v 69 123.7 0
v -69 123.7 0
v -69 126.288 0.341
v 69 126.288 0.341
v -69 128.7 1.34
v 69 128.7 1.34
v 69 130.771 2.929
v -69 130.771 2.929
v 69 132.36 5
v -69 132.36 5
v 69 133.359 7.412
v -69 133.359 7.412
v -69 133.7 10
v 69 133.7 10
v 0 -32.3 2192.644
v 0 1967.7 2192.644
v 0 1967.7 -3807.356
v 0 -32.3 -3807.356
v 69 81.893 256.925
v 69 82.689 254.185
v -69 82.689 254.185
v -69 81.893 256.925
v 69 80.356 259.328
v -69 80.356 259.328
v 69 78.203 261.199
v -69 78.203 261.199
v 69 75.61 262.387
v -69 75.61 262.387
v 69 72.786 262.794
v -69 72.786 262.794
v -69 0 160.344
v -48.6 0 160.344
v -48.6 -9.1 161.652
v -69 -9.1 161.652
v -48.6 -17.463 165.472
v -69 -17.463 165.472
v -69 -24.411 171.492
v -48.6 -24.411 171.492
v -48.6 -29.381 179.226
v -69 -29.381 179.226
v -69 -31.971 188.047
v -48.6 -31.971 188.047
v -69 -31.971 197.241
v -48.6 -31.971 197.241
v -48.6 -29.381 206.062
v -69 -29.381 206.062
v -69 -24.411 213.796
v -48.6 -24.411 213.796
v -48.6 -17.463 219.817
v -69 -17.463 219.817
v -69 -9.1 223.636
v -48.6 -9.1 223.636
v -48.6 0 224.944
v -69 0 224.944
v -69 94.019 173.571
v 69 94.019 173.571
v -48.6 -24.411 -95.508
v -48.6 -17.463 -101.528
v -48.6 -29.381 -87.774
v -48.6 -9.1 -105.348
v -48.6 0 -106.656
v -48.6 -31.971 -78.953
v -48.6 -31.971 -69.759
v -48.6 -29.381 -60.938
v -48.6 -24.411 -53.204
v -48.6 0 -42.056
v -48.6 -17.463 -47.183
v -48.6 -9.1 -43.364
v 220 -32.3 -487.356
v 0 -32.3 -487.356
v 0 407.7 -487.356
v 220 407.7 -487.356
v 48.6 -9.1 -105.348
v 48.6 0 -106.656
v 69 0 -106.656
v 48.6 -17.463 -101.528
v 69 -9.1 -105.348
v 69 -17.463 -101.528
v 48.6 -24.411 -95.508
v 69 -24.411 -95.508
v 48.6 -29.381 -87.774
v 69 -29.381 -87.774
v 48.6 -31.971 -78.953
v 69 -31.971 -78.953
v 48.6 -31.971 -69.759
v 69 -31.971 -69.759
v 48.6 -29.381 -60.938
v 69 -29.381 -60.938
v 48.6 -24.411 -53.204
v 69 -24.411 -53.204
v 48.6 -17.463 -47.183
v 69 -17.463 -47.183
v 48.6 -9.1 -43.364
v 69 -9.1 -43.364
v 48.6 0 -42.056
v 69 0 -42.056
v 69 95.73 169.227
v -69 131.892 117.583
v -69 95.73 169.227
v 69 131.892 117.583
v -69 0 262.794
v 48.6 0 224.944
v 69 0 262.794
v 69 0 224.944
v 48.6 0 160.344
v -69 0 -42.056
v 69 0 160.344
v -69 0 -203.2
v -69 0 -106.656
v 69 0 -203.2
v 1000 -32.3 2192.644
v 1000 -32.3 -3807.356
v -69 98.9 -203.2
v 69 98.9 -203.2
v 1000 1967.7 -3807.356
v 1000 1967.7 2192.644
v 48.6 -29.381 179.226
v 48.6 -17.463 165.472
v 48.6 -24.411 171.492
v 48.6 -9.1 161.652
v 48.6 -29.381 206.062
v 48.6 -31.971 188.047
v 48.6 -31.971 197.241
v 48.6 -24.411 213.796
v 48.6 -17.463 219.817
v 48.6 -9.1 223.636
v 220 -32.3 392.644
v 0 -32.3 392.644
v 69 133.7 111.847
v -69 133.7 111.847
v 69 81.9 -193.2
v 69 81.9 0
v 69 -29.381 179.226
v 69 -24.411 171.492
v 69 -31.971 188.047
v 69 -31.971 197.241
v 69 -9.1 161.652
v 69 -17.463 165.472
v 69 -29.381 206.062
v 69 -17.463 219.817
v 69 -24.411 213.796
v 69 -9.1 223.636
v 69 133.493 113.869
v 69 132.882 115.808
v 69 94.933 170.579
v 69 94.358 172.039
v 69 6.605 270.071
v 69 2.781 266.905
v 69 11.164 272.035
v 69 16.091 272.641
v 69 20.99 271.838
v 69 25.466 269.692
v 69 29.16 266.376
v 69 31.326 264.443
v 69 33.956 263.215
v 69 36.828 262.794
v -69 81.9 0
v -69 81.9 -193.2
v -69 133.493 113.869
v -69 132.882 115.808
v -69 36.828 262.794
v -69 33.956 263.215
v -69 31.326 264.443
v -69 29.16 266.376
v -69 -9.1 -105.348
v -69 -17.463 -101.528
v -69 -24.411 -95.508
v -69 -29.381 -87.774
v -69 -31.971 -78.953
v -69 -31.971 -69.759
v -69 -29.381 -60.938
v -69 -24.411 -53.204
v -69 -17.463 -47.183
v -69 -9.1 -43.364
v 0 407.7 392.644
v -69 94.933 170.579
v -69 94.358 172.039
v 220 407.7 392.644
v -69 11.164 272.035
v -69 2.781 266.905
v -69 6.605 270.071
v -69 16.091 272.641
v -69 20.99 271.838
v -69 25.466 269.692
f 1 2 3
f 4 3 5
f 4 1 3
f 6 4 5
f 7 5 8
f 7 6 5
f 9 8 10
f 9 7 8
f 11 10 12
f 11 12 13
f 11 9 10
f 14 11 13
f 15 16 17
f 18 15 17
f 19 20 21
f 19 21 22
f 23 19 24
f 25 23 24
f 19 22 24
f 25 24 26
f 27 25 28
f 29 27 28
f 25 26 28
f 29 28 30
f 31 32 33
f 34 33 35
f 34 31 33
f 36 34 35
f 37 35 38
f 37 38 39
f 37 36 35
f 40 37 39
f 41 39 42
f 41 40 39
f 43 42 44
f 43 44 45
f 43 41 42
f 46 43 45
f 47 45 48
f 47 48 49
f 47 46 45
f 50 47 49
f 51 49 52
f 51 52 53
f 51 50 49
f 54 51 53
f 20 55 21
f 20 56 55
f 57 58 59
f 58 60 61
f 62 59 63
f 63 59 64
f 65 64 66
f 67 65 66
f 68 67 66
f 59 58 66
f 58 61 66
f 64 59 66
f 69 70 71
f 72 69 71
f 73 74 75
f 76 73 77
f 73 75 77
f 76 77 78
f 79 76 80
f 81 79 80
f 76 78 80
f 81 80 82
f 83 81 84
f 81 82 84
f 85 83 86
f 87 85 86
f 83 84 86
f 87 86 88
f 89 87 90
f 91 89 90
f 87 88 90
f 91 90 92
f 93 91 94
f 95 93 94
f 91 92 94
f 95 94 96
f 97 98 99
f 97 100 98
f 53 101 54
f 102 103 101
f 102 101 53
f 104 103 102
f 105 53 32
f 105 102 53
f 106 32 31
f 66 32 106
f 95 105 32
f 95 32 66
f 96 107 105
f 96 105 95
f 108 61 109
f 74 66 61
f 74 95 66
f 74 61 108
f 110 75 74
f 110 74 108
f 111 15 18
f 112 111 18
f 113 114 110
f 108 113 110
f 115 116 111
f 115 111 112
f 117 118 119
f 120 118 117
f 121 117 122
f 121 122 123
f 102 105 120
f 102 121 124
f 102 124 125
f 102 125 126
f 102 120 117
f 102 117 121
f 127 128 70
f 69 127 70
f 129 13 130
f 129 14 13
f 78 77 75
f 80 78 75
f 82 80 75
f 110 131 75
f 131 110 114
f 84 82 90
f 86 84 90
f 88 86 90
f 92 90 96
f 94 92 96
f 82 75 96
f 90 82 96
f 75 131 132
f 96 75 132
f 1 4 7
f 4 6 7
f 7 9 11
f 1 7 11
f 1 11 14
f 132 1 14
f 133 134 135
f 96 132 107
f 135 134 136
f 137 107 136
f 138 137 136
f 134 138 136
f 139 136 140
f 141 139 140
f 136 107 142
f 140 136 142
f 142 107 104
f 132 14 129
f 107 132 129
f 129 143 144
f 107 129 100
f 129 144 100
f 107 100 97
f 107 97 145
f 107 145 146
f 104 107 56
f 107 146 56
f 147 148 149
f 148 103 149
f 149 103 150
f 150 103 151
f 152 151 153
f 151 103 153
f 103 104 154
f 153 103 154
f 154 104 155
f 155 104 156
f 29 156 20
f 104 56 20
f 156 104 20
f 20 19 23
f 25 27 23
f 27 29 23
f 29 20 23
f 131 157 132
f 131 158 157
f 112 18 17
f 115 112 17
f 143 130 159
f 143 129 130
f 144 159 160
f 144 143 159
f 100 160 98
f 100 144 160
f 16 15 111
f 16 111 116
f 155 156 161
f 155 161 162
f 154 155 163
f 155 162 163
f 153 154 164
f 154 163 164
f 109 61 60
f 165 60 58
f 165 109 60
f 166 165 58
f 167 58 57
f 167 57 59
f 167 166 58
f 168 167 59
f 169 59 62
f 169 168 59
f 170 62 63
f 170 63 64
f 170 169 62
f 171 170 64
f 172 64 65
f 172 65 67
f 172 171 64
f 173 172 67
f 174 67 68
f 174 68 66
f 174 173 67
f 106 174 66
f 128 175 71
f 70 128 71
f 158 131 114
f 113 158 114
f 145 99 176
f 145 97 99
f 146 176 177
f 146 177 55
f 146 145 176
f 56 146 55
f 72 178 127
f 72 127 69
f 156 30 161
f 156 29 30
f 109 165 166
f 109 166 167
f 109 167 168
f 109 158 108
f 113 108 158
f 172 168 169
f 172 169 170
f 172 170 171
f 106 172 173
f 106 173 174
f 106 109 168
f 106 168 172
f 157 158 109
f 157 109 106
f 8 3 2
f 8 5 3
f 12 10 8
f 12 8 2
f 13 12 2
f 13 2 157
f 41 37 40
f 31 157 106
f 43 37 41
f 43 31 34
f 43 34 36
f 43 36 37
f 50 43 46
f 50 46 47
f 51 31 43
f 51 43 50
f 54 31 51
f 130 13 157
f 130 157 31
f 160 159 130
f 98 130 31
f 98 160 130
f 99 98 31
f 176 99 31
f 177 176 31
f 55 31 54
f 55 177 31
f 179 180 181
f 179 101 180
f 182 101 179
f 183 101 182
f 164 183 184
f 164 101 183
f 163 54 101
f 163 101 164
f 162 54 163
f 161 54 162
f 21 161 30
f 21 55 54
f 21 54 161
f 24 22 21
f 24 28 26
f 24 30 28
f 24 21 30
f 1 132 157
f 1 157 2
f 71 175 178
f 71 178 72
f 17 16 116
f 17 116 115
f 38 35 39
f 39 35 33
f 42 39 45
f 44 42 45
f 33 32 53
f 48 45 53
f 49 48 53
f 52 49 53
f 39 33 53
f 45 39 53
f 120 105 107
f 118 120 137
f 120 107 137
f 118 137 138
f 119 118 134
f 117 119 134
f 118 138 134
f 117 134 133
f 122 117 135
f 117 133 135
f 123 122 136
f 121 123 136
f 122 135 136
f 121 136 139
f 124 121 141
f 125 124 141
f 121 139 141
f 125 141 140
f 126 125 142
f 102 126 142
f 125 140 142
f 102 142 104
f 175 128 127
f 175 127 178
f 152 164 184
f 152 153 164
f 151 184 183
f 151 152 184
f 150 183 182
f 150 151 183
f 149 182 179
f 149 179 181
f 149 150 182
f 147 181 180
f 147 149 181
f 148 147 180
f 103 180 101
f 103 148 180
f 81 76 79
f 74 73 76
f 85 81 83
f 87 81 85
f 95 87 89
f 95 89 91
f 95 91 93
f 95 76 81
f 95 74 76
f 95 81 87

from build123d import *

# Parameters (mm, degrees)
BOSS_EXTRUDE1_DEPTH = 69
SKETCH4_W           = 15
SKETCH4_H           = 188.2
BOSS_EXTRUDE2_DEPTH = 61.9
BOSS_EXTRUDE3_DEPTH = 20.4
FILLET1_R           = 10
SKETCH6_W           = 6000
SKETCH6_H           = 2000
BOSS_EXTRUDE4_DEPTH = 1000
SKETCH8_W           = 880
SKETCH8_H           = 440
BOSS_EXTRUDE5_DEPTH = 220
SKETCH9_W           = 108
SKETCH9_H           = 188.2
BOSS_EXTRUDE6_DEPTH = 61.9
BOSS_EXTRUDE7_DEPTH = 138


with BuildPart() as part:
    # Sketch2 → Boss-Extrude1 (new body, symmetric)
    with BuildSketch(Plane(origin=(0, 0, 0), x_dir=(0, 0, -1), z_dir=(1, 0, 0))):
        with BuildLine():
            Line((-262.793626597, 0), (0, 0))
            Line((0, 0), (203.2, 0))
            Line((203.2, 0), (203.2, 81.9))
            Line((203.2, 81.9), (188.2, 81.9))
            Line((188.2, 81.9), (188.2, 20))
            Line((188.2, 20), (0, 20))
            Line((0, 20), (0, 133.7))
            Line((0, 133.7), (-115, 133.7))
            Line((-115, 133.7), (-171.193830238, 94.352656466))
            Line((-171.193830238, 94.352656466), (-262.793626597, 81.479144628))
            Line((-262.793626597, 81.479144628), (-262.793626597, 31.479144628))
            ThreePointArc((-262.793626597, 31.479144628), (-272.644060375, 15.739572314), (-262.793626597, 0))
        make_face()
    extrude(amount=BOSS_EXTRUDE1_DEPTH, both=True)

    # Sketch4 → Boss-Extrude2 (add)
    with BuildSketch(Plane(origin=(0, 20, 0), x_dir=(1, 0, 0), z_dir=(0, 1, 0))):
        with Locations((61.5, 94.1)):
            Rectangle(SKETCH4_W, SKETCH4_H)
    boss_extrude2 = extrude(amount=BOSS_EXTRUDE2_DEPTH)

    # Mirror1: Boss-Extrude2 across plane
    add(boss_extrude2.mirror(Plane(origin=(0, 0, 0), x_dir=(0, 0, 1), z_dir=(1, 0, 0))))

    # Sketch5 → Boss-Extrude3 (add)
    with BuildSketch(Plane(origin=(69, 0, 0), x_dir=(0, 0, -1), z_dir=(1, 0, 0))):
        with BuildLine():
            Line((-224.944060375, 0), (-160.344060375, 0))
            ThreePointArc((-160.344060375, 0), (-192.644060375, -32.3), (-224.944060375, 0))
        make_face()
        with BuildLine():
            Line((42.055939625, 0), (106.655939625, 0))
            ThreePointArc((106.655939625, 0), (74.355939625, -32.3), (42.055939625, 0))
        make_face()
    boss_extrude3 = extrude(amount=-BOSS_EXTRUDE3_DEPTH)

    # Mirror2: Boss-Extrude3 across plane
    add(boss_extrude3.mirror(Plane(origin=(0, 0, 0), x_dir=(0, 0, 1), z_dir=(1, 0, 0))))

    # Fillet1
    fillet1_edges = [part.edges().sort_by_distance(p)[0] for p in [
        (0, 31.479144628, 262.793626597),
        (0, 81.479144628, 262.793626597),
        (0, 94.352656466, 171.193830238),
        (0, 133.7, 115),
        (0, 133.7, 0),
    ]]
    fillet(fillet1_edges, radius=FILLET1_R)

    # Sketch9 → Boss-Extrude6 (add)
    with BuildSketch(Plane(origin=(0, 20, 0), x_dir=(1, 0, 0), z_dir=(0, 1, 0))):
        with Locations((0, 94.1)):
            Rectangle(SKETCH9_W, SKETCH9_H)
    extrude(amount=BOSS_EXTRUDE6_DEPTH)

    # Sketch10 → Boss-Extrude7 (add)
    with BuildSketch(Plane(origin=(69, 0, 0), x_dir=(0, 0, -1), z_dir=(1, 0, 0))):
        Polygon((203.2, 81.9), (193.2, 81.9), (203.2, 98.9), align=None)
    extrude(amount=-BOSS_EXTRUDE7_DEPTH)


with BuildPart() as body_2:
    # Sketch6 → Boss-Extrude4 (new body)
    with BuildSketch(Plane(origin=(0, 0, 0), x_dir=(0, 0, -1), z_dir=(1, 0, 0))):
        with Locations((807.355939625, 967.7)):
            Rectangle(SKETCH6_W, SKETCH6_H)
    extrude(amount=BOSS_EXTRUDE4_DEPTH)


with BuildPart() as body_3:
    # Sketch8 → Boss-Extrude5 (new body)
    with BuildSketch(Plane(origin=(0, 0, 0), x_dir=(0, 0, -1), z_dir=(1, 0, 0))):
        with Locations((47.355939625, 187.7)):
            Rectangle(SKETCH8_W, SKETCH8_H)
    extrude(amount=BOSS_EXTRUDE5_DEPTH)


solid = Compound([part.part, body_2.part, body_3.part])
